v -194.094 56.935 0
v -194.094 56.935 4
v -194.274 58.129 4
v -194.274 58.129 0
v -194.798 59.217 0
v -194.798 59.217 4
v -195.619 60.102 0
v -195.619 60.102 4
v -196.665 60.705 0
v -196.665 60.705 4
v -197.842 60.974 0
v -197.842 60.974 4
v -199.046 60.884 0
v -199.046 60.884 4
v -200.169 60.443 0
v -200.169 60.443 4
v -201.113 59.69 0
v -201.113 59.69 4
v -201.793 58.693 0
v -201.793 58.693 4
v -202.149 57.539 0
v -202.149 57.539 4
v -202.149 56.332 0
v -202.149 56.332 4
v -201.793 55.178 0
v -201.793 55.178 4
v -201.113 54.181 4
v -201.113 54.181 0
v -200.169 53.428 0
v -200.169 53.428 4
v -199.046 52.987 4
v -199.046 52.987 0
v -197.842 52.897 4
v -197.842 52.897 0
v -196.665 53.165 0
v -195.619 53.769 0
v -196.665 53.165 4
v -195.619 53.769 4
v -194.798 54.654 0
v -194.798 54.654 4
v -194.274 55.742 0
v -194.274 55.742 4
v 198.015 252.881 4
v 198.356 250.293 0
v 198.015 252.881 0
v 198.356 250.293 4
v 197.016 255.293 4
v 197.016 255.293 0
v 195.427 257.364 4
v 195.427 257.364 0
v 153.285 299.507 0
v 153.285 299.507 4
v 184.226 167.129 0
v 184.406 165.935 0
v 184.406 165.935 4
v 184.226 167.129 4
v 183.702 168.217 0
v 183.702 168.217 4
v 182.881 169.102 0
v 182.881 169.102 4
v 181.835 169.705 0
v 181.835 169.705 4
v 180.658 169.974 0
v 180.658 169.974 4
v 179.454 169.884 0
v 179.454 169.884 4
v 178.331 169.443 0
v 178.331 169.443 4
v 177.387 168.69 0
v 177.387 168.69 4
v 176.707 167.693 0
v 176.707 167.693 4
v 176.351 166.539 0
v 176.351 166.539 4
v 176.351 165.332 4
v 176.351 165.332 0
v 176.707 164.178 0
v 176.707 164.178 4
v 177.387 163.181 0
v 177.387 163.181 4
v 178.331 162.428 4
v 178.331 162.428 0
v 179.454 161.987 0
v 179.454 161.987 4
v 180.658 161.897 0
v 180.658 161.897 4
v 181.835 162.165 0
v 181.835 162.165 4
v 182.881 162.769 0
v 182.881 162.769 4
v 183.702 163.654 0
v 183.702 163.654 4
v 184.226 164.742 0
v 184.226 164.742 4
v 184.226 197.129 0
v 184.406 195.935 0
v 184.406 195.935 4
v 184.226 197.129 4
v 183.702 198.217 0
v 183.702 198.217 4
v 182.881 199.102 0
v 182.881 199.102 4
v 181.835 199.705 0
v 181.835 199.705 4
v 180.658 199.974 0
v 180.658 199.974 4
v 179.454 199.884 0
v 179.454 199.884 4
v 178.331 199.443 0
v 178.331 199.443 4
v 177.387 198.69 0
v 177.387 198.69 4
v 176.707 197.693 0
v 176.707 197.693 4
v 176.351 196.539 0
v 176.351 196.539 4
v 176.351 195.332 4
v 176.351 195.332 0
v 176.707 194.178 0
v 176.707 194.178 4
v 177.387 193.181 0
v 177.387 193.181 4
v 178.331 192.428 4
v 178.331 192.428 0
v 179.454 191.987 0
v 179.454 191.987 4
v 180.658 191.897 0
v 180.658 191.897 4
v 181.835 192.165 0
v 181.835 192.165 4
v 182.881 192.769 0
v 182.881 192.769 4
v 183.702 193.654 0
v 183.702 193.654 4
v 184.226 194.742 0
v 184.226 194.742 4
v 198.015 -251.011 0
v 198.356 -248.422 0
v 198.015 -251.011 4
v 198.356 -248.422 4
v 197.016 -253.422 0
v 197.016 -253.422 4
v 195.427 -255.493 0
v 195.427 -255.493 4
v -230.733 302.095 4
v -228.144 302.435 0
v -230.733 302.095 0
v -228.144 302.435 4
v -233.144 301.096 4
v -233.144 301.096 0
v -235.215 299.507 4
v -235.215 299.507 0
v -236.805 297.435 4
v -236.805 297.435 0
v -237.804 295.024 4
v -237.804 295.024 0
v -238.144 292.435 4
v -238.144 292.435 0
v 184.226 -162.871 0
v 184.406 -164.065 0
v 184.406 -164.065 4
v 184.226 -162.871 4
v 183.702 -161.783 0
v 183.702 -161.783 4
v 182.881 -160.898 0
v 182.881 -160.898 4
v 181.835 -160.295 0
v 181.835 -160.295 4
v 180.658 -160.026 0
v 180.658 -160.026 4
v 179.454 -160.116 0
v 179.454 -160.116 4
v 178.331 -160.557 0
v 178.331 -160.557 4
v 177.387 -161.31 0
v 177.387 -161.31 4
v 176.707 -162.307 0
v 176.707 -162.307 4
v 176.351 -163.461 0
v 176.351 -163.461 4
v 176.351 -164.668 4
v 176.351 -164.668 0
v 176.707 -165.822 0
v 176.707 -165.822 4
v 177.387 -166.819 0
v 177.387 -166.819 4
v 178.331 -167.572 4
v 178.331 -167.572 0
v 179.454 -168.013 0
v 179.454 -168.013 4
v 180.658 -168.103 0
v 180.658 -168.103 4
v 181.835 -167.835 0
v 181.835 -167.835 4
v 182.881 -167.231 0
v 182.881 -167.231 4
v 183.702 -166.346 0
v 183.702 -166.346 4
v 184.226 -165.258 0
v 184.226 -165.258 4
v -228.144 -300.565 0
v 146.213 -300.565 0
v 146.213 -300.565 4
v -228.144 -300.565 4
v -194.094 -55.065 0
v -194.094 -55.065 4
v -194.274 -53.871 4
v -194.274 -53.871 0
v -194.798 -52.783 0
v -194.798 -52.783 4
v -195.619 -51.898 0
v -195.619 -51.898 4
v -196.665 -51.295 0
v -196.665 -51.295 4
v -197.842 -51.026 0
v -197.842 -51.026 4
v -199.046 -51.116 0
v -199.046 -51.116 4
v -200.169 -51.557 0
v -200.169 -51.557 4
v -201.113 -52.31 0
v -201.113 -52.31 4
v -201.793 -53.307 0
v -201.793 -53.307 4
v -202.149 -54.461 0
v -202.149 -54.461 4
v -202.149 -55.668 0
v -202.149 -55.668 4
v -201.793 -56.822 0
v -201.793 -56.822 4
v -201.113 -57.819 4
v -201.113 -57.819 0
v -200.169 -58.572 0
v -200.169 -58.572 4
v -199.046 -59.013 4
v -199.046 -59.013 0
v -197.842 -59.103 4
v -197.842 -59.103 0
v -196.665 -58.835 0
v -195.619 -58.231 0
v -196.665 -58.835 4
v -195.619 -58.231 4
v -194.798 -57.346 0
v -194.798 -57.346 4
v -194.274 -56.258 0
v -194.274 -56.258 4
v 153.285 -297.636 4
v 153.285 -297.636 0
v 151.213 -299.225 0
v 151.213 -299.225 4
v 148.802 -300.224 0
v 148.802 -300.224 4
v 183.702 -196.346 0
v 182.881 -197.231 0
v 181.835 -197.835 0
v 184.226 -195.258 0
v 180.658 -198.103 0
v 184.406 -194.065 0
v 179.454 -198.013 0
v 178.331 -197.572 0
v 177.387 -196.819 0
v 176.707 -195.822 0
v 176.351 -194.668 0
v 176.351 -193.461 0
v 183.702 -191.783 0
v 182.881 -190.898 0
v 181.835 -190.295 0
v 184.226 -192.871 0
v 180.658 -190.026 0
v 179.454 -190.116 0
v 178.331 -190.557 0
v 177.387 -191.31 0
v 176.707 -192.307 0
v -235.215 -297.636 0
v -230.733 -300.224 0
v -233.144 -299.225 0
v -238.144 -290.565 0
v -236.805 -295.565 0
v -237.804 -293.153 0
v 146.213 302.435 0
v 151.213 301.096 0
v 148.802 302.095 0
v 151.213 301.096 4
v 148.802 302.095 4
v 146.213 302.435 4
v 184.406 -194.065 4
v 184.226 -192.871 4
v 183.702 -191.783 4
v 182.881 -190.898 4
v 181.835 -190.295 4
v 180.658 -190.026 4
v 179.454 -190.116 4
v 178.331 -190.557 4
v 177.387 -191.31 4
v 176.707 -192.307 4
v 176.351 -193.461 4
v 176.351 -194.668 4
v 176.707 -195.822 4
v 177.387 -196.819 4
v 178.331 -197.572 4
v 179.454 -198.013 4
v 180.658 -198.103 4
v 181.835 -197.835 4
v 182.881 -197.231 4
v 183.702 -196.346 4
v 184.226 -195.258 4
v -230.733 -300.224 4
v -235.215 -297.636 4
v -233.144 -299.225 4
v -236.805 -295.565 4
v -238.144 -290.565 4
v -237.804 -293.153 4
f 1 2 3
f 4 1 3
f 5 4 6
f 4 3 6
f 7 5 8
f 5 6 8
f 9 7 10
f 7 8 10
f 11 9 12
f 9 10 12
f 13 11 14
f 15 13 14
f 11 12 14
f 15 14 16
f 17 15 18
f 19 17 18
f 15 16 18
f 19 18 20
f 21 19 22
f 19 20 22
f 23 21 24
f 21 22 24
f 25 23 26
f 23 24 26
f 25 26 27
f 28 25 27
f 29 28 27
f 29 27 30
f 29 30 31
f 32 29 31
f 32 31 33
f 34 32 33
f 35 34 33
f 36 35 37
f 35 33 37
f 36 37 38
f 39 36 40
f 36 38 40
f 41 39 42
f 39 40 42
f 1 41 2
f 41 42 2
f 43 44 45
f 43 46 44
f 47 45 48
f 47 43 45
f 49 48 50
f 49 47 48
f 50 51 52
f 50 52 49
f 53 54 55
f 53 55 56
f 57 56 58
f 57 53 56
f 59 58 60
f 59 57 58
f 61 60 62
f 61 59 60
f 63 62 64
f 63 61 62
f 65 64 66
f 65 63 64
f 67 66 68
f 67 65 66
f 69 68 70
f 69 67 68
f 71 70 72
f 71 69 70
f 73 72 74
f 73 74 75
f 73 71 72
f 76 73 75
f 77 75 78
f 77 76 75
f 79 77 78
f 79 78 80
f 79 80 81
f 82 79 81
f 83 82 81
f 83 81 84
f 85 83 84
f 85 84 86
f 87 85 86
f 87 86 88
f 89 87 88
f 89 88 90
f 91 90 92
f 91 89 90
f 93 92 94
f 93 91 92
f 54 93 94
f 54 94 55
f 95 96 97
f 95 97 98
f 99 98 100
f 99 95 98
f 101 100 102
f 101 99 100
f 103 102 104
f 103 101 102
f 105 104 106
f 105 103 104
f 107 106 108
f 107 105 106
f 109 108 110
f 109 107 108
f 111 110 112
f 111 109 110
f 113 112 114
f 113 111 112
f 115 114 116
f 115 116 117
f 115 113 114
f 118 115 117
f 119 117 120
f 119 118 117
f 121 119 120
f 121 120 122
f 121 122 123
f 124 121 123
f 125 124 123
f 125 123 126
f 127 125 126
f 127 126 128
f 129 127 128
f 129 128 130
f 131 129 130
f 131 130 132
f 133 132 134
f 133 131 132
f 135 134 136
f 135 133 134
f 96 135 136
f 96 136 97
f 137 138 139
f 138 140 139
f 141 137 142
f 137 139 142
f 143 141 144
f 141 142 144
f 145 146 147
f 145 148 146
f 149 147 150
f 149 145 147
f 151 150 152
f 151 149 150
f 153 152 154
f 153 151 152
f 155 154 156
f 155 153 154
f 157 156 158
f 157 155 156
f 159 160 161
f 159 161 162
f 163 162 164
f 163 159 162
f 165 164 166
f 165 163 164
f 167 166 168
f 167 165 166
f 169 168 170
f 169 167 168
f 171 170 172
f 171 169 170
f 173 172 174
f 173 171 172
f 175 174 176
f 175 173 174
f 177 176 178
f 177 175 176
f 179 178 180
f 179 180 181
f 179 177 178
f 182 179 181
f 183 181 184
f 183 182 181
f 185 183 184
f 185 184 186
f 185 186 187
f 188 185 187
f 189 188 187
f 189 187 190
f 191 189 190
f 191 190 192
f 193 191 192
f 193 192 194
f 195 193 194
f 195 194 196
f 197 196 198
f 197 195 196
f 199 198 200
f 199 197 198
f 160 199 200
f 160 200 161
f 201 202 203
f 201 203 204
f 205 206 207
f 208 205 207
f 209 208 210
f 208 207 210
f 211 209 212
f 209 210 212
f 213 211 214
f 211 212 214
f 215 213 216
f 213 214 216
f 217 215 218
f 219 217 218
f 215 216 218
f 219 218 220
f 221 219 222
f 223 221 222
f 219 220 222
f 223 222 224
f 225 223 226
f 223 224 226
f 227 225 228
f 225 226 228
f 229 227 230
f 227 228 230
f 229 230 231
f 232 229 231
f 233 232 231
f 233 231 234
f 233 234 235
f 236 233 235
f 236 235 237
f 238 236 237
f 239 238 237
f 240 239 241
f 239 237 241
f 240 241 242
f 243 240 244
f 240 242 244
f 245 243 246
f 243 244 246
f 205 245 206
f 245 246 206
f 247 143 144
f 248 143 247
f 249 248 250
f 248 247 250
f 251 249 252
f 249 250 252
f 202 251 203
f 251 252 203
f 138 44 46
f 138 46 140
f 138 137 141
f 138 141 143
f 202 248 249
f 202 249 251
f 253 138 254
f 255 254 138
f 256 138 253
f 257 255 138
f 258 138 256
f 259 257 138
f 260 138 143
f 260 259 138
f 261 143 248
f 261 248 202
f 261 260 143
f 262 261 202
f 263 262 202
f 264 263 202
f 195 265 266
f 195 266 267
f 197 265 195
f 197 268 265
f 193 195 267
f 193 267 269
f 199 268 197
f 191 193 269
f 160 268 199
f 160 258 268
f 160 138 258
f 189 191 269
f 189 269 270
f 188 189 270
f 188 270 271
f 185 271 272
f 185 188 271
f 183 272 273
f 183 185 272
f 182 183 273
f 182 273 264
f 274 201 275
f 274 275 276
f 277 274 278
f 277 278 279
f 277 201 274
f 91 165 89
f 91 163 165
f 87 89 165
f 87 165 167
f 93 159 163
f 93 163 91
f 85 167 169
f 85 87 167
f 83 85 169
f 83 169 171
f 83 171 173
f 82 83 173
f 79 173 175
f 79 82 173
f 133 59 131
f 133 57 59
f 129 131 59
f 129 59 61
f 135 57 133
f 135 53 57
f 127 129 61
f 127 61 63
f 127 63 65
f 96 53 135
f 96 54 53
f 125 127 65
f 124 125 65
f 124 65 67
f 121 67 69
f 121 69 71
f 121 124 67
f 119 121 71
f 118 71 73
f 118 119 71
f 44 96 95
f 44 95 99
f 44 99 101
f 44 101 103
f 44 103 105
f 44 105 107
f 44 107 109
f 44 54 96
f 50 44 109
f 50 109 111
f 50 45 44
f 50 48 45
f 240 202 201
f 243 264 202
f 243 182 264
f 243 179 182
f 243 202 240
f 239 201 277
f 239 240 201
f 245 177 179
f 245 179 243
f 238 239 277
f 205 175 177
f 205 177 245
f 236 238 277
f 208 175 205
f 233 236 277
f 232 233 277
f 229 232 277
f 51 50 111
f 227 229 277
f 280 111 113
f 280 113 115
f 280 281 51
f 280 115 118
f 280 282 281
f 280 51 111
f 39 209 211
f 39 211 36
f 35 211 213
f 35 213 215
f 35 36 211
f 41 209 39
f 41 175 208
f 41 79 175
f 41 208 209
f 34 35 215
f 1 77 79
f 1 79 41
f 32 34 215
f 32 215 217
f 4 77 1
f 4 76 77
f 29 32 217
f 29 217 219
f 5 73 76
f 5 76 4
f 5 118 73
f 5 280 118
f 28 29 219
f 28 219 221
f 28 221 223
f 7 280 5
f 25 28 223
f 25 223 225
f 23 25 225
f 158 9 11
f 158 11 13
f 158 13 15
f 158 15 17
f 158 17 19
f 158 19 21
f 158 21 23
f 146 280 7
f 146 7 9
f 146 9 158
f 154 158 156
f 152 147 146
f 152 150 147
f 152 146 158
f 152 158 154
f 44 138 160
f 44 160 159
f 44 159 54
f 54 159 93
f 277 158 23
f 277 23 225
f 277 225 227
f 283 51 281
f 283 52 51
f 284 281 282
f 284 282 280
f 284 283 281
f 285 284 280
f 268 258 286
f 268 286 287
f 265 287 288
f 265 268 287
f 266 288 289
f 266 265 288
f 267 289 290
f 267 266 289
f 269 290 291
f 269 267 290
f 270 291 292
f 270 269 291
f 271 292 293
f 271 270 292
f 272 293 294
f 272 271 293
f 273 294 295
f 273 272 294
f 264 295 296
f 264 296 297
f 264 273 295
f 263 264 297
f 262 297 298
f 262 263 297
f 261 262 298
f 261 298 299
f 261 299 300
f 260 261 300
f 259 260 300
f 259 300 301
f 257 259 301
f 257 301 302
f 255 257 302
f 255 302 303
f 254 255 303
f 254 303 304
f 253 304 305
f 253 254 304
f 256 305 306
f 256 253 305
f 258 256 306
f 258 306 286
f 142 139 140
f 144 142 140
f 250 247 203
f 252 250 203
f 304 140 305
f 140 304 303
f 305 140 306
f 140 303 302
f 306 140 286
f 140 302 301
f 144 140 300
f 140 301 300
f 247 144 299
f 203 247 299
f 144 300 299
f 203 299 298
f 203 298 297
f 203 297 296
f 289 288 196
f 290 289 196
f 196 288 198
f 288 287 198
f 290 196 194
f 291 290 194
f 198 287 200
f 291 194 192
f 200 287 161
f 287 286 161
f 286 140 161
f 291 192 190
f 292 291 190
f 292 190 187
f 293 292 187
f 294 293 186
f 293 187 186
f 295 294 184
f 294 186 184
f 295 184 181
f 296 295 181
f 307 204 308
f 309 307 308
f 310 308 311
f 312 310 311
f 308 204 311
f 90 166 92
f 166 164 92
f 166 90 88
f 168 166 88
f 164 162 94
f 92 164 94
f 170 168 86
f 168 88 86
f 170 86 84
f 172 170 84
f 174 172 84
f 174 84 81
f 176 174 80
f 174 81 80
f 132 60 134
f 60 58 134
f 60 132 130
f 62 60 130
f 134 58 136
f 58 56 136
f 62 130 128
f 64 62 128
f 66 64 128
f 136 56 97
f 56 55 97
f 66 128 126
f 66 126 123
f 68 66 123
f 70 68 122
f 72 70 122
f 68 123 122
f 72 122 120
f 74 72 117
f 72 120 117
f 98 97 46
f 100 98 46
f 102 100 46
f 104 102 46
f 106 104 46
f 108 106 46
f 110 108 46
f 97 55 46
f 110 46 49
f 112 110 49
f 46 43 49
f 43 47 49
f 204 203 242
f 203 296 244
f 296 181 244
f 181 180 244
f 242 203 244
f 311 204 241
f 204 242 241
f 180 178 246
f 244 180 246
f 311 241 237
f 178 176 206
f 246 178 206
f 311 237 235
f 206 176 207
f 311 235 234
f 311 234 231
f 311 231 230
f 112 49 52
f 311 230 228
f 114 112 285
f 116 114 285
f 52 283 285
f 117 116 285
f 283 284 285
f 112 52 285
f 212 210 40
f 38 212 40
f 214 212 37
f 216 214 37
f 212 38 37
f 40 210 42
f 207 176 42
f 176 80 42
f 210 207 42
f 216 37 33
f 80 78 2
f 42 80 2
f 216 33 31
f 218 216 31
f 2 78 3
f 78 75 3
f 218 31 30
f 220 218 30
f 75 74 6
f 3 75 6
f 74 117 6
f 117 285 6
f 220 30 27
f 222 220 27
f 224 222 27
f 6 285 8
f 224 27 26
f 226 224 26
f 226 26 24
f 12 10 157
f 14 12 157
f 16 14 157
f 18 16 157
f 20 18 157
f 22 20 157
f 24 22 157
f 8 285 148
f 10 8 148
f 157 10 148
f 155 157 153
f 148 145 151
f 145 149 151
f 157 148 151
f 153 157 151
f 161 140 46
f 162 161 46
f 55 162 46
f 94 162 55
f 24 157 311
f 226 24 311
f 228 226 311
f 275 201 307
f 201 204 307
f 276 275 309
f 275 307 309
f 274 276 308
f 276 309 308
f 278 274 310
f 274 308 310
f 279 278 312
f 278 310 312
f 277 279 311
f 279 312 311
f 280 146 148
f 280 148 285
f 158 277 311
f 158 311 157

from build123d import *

# Parameters (mm, degrees)
SKETCH1_R           = 4.05
BOSS_EXTRUDE1_DEPTH = 4
FILLET1_R           = 10
SKETCH2_R           = 4.05
CUT_EXTRUDE1_DEPTH  = 4


with BuildPart() as part:
    # Sketch1 → Boss-Extrude1 (new body)
    with BuildSketch(Plane.XY):
        Polygon((198.355613631, 254.435441941), (198.355613631, -252.564558059), (150.355613631, -300.564558059), (-238.144386369, -300.564558059), (-238.144386369, 302.435441941), (150.355613631, 302.435441941), align=None)
        with Locations((180.355613631, 195.935441941)):
            Circle(SKETCH1_R, mode=Mode.SUBTRACT)
        with Locations((180.355613631, 165.935441941)):
            Circle(SKETCH1_R, mode=Mode.SUBTRACT)
        with Locations((180.355613631, -164.064558059)):
            Circle(SKETCH1_R, mode=Mode.SUBTRACT)
        with Locations((180.355613631, -194.064558059)):
            Circle(SKETCH1_R, mode=Mode.SUBTRACT)
    extrude(amount=BOSS_EXTRUDE1_DEPTH)

    # Fillet1
    fillet1_edges = [part.edges().sort_by_distance(p)[0] for p in [
        (-238.144386369, 302.435441941, 2),
        (150.355613631, 302.435441941, 2),
        (198.355613631, 254.435441941, 2),
        (198.355613631, -252.564558059, 2),
        (150.355613631, -300.564558059, 2),
        (-238.144386369, -300.564558059, 2),
    ]]
    fillet(fillet1_edges, radius=FILLET1_R)

    # Sketch2 → Cut-Extrude1 (cut)
    with BuildSketch(Plane.XY.offset(4)):
        with Locations((-198.144386369, 56.935441941)):
            Circle(SKETCH2_R)
        with Locations((-198.144386369, -55.064558059)):
            Circle(SKETCH2_R)
    extrude(amount=-CUT_EXTRUDE1_DEPTH, mode=Mode.SUBTRACT)


solid = part.part
